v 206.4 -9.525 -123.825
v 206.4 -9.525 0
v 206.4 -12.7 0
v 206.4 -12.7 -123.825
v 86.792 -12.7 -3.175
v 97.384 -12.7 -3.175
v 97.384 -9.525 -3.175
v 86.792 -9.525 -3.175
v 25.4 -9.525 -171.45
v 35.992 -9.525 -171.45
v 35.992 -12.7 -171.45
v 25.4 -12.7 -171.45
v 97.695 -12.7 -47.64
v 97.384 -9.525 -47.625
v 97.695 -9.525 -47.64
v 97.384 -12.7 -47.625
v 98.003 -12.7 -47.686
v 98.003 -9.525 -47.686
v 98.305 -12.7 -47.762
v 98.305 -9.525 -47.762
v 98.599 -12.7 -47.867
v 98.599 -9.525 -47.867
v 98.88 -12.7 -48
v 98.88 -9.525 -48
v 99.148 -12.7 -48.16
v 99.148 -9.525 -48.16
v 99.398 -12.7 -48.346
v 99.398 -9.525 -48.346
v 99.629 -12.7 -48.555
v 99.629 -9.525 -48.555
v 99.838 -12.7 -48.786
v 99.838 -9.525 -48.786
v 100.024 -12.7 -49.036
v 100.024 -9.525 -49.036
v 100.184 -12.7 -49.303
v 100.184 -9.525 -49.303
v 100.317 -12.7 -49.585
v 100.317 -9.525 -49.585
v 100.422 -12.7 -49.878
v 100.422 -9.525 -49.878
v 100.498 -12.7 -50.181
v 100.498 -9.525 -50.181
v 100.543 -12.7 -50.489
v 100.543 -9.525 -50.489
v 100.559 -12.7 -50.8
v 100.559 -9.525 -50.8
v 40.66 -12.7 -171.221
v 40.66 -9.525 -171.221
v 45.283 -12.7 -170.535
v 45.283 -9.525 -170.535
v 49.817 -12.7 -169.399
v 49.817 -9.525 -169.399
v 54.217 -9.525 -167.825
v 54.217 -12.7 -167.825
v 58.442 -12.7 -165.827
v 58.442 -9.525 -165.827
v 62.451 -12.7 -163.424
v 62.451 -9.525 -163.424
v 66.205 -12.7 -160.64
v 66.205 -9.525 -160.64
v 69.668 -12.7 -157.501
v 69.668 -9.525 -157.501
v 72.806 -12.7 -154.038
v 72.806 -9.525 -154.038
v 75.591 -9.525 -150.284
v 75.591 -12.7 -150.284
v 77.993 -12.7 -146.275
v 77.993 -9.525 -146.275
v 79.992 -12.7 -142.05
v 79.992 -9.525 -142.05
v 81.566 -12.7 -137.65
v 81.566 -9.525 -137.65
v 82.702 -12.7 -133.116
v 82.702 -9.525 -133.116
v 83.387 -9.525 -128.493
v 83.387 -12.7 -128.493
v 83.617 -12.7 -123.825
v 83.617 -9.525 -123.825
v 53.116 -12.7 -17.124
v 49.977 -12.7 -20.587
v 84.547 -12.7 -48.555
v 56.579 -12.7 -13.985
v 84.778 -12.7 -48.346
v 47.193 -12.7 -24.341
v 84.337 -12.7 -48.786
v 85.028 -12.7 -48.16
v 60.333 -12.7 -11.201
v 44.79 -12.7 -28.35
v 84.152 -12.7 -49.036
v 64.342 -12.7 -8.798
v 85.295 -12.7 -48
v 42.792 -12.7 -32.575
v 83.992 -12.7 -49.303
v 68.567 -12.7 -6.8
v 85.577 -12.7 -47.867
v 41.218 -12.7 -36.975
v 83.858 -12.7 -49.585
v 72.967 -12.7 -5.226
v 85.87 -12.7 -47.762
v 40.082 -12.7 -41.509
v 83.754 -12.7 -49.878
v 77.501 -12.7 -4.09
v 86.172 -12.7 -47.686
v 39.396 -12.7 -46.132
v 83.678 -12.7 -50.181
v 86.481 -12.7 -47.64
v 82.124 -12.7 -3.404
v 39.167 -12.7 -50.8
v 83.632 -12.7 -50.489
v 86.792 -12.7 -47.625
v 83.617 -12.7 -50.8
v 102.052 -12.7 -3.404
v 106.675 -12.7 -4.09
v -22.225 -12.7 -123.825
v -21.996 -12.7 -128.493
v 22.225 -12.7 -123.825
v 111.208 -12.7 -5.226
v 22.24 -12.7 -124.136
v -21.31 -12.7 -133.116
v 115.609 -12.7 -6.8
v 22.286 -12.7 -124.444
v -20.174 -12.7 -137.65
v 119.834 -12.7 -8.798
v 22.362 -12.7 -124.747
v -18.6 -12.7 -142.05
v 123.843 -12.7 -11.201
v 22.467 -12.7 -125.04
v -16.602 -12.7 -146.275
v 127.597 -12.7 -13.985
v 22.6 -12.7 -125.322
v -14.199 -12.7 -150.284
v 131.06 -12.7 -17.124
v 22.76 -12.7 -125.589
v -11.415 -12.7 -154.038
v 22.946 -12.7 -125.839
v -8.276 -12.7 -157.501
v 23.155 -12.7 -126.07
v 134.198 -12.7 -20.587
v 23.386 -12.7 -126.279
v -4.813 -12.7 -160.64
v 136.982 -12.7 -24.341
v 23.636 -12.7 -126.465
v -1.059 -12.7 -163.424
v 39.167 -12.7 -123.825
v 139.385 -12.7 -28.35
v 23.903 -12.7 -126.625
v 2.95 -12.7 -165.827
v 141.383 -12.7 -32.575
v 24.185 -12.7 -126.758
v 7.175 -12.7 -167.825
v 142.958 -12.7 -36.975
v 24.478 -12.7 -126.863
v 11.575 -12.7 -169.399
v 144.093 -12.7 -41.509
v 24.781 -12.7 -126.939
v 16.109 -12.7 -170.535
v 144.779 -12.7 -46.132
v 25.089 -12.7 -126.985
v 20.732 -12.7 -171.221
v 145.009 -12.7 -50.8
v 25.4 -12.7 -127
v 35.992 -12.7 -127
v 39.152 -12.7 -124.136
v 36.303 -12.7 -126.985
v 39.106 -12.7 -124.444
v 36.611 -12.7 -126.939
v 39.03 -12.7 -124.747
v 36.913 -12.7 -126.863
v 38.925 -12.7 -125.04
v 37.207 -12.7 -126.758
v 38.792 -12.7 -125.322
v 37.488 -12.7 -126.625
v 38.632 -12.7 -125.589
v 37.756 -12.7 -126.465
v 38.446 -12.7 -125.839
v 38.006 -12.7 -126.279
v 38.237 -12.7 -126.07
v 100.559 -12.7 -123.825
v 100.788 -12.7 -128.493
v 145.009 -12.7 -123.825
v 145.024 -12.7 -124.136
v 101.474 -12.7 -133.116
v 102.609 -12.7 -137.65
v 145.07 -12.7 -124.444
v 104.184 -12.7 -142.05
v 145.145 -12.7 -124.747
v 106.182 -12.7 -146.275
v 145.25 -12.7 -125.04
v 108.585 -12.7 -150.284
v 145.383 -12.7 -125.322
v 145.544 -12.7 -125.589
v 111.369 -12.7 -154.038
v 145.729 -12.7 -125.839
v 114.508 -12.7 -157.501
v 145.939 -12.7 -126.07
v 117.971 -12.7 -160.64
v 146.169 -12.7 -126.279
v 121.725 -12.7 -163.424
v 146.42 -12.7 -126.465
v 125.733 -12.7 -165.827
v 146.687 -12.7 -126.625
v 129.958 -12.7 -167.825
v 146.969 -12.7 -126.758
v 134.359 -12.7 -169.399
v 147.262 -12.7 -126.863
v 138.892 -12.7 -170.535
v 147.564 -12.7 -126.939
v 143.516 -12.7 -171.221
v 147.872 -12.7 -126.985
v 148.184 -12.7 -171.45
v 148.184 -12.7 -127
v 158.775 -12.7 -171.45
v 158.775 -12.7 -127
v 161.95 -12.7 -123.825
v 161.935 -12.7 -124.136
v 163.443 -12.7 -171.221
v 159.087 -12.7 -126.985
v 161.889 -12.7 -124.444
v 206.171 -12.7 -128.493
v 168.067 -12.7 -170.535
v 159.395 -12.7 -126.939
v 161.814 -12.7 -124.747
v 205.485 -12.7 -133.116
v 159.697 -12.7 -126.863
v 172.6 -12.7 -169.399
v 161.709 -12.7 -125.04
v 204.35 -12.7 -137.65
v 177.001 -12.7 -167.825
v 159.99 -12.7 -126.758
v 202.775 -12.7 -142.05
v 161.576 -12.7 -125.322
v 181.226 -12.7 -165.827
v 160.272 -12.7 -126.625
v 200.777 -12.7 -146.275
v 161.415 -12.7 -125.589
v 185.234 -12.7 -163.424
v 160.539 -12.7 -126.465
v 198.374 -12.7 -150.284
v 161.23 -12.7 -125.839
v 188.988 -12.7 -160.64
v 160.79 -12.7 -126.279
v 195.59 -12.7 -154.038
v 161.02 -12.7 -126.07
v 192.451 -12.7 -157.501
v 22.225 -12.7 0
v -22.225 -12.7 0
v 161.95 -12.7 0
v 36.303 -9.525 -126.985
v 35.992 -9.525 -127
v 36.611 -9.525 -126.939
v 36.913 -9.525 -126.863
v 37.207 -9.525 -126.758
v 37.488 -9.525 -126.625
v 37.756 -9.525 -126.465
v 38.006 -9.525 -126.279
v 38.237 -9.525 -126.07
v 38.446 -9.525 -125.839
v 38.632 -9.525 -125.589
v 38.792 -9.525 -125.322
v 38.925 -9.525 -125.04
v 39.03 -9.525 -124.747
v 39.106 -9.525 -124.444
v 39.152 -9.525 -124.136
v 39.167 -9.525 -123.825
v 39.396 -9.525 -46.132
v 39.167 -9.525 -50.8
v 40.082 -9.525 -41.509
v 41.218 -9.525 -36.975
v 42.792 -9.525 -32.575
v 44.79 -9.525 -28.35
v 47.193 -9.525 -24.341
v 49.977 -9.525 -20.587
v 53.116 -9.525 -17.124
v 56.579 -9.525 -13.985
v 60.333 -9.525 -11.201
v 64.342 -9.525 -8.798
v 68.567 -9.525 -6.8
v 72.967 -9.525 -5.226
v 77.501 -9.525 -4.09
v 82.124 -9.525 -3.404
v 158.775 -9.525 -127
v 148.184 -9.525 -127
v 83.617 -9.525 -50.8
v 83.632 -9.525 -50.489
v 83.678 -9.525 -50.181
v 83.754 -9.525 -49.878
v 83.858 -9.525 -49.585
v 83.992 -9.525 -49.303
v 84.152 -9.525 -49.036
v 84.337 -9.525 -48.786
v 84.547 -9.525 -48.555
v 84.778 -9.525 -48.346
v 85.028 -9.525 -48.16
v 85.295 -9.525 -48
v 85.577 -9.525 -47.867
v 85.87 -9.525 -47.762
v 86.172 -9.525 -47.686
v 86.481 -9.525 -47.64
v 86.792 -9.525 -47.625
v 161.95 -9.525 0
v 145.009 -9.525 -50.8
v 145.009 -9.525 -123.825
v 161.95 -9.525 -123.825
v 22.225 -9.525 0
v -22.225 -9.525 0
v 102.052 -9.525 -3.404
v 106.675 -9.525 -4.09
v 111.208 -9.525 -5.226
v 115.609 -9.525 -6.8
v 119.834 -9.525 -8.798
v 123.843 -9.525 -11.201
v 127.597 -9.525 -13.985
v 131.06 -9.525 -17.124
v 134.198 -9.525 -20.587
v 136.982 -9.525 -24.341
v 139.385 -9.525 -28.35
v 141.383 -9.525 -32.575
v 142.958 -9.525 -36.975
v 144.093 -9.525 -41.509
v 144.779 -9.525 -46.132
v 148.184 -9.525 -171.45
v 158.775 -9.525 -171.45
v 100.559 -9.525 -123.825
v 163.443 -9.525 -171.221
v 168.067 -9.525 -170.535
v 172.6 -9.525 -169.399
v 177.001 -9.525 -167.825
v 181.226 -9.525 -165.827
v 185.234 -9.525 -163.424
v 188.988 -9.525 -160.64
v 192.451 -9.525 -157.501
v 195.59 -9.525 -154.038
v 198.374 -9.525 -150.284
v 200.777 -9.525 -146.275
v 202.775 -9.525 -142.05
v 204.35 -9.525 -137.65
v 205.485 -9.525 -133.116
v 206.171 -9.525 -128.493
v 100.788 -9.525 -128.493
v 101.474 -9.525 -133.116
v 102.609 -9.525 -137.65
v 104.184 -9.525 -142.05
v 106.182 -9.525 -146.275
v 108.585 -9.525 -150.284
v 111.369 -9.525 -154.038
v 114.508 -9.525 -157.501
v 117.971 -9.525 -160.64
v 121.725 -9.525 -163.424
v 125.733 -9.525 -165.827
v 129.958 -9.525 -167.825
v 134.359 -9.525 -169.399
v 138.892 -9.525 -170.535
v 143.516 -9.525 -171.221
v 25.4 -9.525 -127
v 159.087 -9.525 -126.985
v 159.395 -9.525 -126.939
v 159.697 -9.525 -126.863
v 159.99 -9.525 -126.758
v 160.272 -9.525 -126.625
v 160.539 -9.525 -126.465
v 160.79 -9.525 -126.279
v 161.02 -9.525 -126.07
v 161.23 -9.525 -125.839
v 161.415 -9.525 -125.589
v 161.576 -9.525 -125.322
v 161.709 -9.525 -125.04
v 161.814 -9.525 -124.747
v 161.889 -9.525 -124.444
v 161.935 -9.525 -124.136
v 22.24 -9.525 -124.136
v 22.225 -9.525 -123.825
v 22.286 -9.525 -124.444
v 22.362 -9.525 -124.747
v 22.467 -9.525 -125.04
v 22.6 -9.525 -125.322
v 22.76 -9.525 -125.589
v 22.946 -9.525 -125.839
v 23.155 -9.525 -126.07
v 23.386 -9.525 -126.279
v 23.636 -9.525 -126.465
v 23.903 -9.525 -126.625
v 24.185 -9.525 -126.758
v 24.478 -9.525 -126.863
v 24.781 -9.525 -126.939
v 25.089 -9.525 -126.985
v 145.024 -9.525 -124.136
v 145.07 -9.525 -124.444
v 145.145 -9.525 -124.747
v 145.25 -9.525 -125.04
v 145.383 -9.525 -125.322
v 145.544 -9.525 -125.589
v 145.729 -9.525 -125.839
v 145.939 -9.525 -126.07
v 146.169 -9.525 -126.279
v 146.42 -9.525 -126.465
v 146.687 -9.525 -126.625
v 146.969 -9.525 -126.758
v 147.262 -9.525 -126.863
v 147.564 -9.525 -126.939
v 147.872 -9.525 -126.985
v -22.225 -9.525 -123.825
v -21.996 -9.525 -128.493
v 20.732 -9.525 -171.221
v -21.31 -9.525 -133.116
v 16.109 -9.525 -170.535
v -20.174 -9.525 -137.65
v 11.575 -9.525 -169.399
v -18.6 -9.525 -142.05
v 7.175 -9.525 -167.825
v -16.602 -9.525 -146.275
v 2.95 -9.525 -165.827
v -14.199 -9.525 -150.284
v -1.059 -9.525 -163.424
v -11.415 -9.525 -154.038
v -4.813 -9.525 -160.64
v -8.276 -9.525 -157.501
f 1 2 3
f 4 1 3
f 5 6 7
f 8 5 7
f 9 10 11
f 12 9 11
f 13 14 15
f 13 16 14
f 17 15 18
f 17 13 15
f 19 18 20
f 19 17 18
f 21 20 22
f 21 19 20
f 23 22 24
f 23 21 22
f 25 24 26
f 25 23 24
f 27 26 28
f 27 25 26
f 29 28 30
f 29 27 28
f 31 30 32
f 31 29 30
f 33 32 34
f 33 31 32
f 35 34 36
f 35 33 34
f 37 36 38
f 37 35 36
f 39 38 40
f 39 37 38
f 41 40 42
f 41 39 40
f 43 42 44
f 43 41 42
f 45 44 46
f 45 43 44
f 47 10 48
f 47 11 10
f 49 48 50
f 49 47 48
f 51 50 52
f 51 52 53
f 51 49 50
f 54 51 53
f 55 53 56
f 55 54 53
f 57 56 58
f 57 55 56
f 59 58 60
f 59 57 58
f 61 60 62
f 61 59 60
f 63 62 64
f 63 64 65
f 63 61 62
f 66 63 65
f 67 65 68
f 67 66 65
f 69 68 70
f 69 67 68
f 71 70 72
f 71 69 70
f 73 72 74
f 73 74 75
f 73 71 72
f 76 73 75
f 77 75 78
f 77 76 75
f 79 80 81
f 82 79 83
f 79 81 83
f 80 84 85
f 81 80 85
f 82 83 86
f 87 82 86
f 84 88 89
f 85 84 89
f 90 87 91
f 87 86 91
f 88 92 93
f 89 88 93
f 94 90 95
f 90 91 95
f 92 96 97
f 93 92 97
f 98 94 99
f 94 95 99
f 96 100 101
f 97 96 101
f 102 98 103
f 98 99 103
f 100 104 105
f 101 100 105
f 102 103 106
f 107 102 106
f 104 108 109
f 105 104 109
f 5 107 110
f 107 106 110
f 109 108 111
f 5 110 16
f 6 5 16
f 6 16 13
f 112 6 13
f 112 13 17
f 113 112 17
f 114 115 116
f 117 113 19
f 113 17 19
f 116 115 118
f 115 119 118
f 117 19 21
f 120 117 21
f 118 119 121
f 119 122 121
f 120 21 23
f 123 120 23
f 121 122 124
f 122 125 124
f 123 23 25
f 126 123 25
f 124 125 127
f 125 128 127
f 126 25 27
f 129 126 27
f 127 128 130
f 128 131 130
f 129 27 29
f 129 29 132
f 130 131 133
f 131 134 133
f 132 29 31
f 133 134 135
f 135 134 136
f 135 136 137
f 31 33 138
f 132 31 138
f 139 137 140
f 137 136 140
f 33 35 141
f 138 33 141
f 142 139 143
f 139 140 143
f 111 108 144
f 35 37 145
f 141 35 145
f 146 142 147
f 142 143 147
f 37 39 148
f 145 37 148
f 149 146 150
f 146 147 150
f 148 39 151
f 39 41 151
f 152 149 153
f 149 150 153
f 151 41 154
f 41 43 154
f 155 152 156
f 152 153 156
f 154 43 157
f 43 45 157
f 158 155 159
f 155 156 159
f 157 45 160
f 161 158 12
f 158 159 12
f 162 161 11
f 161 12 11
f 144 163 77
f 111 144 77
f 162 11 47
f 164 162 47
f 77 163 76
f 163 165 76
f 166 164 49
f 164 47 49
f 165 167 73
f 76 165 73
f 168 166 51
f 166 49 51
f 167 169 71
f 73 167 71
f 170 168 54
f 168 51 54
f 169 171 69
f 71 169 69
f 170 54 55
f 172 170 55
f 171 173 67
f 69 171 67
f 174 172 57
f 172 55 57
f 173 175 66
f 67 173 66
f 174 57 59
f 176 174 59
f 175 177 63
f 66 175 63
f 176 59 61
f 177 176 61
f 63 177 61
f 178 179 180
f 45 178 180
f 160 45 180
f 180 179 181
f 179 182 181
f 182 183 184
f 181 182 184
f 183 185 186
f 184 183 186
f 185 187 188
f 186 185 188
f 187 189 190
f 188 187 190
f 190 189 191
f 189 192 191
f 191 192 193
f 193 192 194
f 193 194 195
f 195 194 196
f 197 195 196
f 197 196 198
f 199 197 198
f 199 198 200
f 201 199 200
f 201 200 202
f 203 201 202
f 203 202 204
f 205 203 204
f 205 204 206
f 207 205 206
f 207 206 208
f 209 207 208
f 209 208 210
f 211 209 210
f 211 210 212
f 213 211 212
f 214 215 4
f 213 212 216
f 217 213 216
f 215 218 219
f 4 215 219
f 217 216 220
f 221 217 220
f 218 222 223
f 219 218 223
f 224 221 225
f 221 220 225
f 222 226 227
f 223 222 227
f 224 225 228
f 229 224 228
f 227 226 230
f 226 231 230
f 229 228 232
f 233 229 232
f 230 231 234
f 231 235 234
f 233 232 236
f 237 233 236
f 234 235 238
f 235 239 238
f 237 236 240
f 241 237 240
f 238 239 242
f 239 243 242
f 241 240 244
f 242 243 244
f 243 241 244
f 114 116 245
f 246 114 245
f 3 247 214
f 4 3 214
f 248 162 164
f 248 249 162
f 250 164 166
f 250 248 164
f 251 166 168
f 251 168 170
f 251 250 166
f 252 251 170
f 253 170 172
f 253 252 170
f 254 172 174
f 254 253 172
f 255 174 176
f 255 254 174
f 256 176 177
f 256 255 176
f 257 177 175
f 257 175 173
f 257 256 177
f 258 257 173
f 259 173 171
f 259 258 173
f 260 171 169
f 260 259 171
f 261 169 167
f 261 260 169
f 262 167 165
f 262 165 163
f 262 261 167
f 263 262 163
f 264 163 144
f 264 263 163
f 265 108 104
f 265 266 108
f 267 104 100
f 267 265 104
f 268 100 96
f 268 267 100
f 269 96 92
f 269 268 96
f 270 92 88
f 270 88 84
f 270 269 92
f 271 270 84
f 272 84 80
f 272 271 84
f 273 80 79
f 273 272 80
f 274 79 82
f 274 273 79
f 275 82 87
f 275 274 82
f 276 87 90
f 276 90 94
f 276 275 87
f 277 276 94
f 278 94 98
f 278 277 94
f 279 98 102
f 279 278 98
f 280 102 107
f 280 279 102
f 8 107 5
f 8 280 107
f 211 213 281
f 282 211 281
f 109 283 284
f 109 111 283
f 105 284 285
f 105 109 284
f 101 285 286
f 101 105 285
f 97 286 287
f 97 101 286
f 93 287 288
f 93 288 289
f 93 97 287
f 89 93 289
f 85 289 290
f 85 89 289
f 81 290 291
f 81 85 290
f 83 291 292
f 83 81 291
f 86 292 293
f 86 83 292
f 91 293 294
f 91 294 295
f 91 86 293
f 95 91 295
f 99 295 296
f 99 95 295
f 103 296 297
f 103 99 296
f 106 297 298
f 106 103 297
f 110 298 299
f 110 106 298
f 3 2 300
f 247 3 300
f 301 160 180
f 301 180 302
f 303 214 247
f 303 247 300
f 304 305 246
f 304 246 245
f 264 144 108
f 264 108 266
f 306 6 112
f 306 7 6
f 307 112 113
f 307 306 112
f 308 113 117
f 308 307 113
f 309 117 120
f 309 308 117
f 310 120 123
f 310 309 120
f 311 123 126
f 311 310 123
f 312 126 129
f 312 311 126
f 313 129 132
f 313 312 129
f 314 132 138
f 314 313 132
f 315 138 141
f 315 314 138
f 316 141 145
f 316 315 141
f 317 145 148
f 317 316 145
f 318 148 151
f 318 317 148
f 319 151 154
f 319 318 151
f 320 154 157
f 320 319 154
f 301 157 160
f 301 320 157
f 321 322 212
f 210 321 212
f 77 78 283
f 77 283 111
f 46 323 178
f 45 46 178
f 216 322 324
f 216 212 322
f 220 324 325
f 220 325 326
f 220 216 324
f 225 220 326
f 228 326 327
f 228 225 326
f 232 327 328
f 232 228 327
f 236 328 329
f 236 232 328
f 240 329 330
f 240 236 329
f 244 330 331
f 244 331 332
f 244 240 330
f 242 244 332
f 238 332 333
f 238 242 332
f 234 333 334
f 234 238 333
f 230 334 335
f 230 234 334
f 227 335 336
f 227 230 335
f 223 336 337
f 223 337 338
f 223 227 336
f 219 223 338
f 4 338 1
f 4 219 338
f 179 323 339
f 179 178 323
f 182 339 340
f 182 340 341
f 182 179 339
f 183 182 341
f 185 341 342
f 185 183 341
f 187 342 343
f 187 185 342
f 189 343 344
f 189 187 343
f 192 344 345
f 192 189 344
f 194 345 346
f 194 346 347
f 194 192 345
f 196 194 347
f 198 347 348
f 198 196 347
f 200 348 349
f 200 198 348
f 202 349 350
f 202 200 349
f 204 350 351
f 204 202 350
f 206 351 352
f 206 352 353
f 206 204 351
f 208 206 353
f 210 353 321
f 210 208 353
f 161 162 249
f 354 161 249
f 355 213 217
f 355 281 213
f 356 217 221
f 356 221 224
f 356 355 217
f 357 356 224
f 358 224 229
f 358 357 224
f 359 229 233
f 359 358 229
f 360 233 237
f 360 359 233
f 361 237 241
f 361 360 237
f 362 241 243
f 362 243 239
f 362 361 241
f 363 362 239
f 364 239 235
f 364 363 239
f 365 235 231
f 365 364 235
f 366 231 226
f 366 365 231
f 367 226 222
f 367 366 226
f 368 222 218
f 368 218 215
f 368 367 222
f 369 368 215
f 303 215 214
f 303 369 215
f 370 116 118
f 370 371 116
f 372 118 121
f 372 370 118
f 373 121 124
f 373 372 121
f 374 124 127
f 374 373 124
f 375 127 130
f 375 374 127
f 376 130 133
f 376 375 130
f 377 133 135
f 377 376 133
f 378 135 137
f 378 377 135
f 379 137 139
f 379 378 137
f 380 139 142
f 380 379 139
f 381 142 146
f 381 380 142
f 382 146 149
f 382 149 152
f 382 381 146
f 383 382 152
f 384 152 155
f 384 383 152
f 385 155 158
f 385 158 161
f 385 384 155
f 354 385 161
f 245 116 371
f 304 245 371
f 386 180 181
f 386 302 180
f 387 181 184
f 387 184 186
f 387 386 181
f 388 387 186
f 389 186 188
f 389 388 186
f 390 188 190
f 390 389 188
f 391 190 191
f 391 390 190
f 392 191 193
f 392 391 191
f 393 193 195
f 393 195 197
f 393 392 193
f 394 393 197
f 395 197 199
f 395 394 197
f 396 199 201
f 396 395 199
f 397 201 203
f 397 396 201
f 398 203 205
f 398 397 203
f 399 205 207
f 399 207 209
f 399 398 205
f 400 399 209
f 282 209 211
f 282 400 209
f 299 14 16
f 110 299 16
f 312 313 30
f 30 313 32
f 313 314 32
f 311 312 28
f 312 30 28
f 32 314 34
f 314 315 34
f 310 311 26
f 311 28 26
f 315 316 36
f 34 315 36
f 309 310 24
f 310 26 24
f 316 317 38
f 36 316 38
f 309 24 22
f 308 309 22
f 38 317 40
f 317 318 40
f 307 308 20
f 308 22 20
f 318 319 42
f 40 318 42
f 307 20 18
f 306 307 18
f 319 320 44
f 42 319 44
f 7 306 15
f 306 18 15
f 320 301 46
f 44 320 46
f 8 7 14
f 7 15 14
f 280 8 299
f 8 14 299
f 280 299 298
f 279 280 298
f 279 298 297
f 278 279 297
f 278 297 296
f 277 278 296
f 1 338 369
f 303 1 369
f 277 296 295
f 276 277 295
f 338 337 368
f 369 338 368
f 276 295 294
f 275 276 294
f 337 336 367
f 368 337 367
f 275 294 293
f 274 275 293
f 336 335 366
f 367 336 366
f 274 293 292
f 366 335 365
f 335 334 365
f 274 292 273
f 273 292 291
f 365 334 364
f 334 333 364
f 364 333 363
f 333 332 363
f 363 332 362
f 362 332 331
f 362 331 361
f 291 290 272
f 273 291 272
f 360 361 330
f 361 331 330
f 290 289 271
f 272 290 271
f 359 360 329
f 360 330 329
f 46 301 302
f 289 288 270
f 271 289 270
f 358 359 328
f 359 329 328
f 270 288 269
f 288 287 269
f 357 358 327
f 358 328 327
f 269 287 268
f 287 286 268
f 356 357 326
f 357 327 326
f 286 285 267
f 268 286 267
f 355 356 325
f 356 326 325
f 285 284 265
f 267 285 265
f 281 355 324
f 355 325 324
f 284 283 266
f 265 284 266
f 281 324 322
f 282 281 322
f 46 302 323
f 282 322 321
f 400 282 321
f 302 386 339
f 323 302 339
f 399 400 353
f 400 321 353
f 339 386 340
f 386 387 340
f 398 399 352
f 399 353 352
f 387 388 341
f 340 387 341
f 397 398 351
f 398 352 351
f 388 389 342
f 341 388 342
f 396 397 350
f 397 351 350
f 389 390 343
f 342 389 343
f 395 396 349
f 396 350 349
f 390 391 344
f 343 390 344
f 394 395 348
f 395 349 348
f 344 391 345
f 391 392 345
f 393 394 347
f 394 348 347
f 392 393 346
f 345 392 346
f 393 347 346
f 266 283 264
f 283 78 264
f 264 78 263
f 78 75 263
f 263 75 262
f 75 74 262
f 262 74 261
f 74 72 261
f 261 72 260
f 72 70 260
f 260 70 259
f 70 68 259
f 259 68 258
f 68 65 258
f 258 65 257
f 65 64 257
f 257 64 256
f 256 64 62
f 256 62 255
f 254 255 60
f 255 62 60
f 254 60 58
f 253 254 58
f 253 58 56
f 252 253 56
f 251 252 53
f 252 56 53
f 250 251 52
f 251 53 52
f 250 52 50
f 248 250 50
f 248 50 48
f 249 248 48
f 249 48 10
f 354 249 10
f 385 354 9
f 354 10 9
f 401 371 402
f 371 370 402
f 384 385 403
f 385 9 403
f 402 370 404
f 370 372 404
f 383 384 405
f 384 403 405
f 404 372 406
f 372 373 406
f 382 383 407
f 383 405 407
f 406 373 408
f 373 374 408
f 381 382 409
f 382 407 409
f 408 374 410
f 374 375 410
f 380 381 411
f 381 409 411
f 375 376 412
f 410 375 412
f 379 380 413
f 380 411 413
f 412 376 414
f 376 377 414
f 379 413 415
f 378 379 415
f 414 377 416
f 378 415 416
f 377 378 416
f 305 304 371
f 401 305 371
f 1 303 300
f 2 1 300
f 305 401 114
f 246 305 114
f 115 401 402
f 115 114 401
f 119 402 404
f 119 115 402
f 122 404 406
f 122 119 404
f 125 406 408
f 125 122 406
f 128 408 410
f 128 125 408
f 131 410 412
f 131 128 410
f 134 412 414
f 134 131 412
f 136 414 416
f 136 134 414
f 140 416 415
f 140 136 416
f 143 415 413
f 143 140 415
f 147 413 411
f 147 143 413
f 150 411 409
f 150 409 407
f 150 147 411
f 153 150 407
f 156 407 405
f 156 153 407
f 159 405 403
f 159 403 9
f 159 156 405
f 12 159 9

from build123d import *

# Parameters (mm, degrees)
SKETCH6_W = 44.45
SKETCH6_H = 3.175


with BuildPart() as part:
    # Sweep1: sweep along a path in Sketch1
    with BuildLine(Plane(origin=(0, 0, 0), x_dir=(1, 0, 0), z_dir=(0, 1, 0))) as sweep1_path:
        Line((0, 0), (0, 123.825))
        ThreePointArc((0, 123.825), (7.439487758, 141.785512242), (25.4, 149.225))
        Line((25.4, 149.225), (35.9918, 149.225))
        ThreePointArc((35.9918, 149.225), (53.952312242, 141.785512242), (61.3918, 123.825))
        Line((61.3918, 123.825), (61.3918, 50.8))
        ThreePointArc((61.3918, 50.8), (68.831287758, 32.839487758), (86.7918, 25.4))
        Line((86.7918, 25.4), (97.3836, 25.4))
        ThreePointArc((97.3836, 25.4), (115.344112242, 32.839487758), (122.7836, 50.8))
        Line((122.7836, 50.8), (122.7836, 123.825))
        ThreePointArc((122.7836, 123.825), (130.223087758, 141.785512242), (148.1836, 149.225))
        Line((148.1836, 149.225), (158.7754, 149.225))
        ThreePointArc((158.7754, 149.225), (176.735912242, 141.785512242), (184.1754, 123.825))
        Line((184.1754, 123.825), (184.1754, 0))
    # Sketch6 → Sweep1 (sweep)
    with BuildSketch(Plane.XY):
        with Locations((0, -11.1125)):
            Rectangle(SKETCH6_W, SKETCH6_H)
    sweep(path=sweep1_path.line)


solid = part.part
